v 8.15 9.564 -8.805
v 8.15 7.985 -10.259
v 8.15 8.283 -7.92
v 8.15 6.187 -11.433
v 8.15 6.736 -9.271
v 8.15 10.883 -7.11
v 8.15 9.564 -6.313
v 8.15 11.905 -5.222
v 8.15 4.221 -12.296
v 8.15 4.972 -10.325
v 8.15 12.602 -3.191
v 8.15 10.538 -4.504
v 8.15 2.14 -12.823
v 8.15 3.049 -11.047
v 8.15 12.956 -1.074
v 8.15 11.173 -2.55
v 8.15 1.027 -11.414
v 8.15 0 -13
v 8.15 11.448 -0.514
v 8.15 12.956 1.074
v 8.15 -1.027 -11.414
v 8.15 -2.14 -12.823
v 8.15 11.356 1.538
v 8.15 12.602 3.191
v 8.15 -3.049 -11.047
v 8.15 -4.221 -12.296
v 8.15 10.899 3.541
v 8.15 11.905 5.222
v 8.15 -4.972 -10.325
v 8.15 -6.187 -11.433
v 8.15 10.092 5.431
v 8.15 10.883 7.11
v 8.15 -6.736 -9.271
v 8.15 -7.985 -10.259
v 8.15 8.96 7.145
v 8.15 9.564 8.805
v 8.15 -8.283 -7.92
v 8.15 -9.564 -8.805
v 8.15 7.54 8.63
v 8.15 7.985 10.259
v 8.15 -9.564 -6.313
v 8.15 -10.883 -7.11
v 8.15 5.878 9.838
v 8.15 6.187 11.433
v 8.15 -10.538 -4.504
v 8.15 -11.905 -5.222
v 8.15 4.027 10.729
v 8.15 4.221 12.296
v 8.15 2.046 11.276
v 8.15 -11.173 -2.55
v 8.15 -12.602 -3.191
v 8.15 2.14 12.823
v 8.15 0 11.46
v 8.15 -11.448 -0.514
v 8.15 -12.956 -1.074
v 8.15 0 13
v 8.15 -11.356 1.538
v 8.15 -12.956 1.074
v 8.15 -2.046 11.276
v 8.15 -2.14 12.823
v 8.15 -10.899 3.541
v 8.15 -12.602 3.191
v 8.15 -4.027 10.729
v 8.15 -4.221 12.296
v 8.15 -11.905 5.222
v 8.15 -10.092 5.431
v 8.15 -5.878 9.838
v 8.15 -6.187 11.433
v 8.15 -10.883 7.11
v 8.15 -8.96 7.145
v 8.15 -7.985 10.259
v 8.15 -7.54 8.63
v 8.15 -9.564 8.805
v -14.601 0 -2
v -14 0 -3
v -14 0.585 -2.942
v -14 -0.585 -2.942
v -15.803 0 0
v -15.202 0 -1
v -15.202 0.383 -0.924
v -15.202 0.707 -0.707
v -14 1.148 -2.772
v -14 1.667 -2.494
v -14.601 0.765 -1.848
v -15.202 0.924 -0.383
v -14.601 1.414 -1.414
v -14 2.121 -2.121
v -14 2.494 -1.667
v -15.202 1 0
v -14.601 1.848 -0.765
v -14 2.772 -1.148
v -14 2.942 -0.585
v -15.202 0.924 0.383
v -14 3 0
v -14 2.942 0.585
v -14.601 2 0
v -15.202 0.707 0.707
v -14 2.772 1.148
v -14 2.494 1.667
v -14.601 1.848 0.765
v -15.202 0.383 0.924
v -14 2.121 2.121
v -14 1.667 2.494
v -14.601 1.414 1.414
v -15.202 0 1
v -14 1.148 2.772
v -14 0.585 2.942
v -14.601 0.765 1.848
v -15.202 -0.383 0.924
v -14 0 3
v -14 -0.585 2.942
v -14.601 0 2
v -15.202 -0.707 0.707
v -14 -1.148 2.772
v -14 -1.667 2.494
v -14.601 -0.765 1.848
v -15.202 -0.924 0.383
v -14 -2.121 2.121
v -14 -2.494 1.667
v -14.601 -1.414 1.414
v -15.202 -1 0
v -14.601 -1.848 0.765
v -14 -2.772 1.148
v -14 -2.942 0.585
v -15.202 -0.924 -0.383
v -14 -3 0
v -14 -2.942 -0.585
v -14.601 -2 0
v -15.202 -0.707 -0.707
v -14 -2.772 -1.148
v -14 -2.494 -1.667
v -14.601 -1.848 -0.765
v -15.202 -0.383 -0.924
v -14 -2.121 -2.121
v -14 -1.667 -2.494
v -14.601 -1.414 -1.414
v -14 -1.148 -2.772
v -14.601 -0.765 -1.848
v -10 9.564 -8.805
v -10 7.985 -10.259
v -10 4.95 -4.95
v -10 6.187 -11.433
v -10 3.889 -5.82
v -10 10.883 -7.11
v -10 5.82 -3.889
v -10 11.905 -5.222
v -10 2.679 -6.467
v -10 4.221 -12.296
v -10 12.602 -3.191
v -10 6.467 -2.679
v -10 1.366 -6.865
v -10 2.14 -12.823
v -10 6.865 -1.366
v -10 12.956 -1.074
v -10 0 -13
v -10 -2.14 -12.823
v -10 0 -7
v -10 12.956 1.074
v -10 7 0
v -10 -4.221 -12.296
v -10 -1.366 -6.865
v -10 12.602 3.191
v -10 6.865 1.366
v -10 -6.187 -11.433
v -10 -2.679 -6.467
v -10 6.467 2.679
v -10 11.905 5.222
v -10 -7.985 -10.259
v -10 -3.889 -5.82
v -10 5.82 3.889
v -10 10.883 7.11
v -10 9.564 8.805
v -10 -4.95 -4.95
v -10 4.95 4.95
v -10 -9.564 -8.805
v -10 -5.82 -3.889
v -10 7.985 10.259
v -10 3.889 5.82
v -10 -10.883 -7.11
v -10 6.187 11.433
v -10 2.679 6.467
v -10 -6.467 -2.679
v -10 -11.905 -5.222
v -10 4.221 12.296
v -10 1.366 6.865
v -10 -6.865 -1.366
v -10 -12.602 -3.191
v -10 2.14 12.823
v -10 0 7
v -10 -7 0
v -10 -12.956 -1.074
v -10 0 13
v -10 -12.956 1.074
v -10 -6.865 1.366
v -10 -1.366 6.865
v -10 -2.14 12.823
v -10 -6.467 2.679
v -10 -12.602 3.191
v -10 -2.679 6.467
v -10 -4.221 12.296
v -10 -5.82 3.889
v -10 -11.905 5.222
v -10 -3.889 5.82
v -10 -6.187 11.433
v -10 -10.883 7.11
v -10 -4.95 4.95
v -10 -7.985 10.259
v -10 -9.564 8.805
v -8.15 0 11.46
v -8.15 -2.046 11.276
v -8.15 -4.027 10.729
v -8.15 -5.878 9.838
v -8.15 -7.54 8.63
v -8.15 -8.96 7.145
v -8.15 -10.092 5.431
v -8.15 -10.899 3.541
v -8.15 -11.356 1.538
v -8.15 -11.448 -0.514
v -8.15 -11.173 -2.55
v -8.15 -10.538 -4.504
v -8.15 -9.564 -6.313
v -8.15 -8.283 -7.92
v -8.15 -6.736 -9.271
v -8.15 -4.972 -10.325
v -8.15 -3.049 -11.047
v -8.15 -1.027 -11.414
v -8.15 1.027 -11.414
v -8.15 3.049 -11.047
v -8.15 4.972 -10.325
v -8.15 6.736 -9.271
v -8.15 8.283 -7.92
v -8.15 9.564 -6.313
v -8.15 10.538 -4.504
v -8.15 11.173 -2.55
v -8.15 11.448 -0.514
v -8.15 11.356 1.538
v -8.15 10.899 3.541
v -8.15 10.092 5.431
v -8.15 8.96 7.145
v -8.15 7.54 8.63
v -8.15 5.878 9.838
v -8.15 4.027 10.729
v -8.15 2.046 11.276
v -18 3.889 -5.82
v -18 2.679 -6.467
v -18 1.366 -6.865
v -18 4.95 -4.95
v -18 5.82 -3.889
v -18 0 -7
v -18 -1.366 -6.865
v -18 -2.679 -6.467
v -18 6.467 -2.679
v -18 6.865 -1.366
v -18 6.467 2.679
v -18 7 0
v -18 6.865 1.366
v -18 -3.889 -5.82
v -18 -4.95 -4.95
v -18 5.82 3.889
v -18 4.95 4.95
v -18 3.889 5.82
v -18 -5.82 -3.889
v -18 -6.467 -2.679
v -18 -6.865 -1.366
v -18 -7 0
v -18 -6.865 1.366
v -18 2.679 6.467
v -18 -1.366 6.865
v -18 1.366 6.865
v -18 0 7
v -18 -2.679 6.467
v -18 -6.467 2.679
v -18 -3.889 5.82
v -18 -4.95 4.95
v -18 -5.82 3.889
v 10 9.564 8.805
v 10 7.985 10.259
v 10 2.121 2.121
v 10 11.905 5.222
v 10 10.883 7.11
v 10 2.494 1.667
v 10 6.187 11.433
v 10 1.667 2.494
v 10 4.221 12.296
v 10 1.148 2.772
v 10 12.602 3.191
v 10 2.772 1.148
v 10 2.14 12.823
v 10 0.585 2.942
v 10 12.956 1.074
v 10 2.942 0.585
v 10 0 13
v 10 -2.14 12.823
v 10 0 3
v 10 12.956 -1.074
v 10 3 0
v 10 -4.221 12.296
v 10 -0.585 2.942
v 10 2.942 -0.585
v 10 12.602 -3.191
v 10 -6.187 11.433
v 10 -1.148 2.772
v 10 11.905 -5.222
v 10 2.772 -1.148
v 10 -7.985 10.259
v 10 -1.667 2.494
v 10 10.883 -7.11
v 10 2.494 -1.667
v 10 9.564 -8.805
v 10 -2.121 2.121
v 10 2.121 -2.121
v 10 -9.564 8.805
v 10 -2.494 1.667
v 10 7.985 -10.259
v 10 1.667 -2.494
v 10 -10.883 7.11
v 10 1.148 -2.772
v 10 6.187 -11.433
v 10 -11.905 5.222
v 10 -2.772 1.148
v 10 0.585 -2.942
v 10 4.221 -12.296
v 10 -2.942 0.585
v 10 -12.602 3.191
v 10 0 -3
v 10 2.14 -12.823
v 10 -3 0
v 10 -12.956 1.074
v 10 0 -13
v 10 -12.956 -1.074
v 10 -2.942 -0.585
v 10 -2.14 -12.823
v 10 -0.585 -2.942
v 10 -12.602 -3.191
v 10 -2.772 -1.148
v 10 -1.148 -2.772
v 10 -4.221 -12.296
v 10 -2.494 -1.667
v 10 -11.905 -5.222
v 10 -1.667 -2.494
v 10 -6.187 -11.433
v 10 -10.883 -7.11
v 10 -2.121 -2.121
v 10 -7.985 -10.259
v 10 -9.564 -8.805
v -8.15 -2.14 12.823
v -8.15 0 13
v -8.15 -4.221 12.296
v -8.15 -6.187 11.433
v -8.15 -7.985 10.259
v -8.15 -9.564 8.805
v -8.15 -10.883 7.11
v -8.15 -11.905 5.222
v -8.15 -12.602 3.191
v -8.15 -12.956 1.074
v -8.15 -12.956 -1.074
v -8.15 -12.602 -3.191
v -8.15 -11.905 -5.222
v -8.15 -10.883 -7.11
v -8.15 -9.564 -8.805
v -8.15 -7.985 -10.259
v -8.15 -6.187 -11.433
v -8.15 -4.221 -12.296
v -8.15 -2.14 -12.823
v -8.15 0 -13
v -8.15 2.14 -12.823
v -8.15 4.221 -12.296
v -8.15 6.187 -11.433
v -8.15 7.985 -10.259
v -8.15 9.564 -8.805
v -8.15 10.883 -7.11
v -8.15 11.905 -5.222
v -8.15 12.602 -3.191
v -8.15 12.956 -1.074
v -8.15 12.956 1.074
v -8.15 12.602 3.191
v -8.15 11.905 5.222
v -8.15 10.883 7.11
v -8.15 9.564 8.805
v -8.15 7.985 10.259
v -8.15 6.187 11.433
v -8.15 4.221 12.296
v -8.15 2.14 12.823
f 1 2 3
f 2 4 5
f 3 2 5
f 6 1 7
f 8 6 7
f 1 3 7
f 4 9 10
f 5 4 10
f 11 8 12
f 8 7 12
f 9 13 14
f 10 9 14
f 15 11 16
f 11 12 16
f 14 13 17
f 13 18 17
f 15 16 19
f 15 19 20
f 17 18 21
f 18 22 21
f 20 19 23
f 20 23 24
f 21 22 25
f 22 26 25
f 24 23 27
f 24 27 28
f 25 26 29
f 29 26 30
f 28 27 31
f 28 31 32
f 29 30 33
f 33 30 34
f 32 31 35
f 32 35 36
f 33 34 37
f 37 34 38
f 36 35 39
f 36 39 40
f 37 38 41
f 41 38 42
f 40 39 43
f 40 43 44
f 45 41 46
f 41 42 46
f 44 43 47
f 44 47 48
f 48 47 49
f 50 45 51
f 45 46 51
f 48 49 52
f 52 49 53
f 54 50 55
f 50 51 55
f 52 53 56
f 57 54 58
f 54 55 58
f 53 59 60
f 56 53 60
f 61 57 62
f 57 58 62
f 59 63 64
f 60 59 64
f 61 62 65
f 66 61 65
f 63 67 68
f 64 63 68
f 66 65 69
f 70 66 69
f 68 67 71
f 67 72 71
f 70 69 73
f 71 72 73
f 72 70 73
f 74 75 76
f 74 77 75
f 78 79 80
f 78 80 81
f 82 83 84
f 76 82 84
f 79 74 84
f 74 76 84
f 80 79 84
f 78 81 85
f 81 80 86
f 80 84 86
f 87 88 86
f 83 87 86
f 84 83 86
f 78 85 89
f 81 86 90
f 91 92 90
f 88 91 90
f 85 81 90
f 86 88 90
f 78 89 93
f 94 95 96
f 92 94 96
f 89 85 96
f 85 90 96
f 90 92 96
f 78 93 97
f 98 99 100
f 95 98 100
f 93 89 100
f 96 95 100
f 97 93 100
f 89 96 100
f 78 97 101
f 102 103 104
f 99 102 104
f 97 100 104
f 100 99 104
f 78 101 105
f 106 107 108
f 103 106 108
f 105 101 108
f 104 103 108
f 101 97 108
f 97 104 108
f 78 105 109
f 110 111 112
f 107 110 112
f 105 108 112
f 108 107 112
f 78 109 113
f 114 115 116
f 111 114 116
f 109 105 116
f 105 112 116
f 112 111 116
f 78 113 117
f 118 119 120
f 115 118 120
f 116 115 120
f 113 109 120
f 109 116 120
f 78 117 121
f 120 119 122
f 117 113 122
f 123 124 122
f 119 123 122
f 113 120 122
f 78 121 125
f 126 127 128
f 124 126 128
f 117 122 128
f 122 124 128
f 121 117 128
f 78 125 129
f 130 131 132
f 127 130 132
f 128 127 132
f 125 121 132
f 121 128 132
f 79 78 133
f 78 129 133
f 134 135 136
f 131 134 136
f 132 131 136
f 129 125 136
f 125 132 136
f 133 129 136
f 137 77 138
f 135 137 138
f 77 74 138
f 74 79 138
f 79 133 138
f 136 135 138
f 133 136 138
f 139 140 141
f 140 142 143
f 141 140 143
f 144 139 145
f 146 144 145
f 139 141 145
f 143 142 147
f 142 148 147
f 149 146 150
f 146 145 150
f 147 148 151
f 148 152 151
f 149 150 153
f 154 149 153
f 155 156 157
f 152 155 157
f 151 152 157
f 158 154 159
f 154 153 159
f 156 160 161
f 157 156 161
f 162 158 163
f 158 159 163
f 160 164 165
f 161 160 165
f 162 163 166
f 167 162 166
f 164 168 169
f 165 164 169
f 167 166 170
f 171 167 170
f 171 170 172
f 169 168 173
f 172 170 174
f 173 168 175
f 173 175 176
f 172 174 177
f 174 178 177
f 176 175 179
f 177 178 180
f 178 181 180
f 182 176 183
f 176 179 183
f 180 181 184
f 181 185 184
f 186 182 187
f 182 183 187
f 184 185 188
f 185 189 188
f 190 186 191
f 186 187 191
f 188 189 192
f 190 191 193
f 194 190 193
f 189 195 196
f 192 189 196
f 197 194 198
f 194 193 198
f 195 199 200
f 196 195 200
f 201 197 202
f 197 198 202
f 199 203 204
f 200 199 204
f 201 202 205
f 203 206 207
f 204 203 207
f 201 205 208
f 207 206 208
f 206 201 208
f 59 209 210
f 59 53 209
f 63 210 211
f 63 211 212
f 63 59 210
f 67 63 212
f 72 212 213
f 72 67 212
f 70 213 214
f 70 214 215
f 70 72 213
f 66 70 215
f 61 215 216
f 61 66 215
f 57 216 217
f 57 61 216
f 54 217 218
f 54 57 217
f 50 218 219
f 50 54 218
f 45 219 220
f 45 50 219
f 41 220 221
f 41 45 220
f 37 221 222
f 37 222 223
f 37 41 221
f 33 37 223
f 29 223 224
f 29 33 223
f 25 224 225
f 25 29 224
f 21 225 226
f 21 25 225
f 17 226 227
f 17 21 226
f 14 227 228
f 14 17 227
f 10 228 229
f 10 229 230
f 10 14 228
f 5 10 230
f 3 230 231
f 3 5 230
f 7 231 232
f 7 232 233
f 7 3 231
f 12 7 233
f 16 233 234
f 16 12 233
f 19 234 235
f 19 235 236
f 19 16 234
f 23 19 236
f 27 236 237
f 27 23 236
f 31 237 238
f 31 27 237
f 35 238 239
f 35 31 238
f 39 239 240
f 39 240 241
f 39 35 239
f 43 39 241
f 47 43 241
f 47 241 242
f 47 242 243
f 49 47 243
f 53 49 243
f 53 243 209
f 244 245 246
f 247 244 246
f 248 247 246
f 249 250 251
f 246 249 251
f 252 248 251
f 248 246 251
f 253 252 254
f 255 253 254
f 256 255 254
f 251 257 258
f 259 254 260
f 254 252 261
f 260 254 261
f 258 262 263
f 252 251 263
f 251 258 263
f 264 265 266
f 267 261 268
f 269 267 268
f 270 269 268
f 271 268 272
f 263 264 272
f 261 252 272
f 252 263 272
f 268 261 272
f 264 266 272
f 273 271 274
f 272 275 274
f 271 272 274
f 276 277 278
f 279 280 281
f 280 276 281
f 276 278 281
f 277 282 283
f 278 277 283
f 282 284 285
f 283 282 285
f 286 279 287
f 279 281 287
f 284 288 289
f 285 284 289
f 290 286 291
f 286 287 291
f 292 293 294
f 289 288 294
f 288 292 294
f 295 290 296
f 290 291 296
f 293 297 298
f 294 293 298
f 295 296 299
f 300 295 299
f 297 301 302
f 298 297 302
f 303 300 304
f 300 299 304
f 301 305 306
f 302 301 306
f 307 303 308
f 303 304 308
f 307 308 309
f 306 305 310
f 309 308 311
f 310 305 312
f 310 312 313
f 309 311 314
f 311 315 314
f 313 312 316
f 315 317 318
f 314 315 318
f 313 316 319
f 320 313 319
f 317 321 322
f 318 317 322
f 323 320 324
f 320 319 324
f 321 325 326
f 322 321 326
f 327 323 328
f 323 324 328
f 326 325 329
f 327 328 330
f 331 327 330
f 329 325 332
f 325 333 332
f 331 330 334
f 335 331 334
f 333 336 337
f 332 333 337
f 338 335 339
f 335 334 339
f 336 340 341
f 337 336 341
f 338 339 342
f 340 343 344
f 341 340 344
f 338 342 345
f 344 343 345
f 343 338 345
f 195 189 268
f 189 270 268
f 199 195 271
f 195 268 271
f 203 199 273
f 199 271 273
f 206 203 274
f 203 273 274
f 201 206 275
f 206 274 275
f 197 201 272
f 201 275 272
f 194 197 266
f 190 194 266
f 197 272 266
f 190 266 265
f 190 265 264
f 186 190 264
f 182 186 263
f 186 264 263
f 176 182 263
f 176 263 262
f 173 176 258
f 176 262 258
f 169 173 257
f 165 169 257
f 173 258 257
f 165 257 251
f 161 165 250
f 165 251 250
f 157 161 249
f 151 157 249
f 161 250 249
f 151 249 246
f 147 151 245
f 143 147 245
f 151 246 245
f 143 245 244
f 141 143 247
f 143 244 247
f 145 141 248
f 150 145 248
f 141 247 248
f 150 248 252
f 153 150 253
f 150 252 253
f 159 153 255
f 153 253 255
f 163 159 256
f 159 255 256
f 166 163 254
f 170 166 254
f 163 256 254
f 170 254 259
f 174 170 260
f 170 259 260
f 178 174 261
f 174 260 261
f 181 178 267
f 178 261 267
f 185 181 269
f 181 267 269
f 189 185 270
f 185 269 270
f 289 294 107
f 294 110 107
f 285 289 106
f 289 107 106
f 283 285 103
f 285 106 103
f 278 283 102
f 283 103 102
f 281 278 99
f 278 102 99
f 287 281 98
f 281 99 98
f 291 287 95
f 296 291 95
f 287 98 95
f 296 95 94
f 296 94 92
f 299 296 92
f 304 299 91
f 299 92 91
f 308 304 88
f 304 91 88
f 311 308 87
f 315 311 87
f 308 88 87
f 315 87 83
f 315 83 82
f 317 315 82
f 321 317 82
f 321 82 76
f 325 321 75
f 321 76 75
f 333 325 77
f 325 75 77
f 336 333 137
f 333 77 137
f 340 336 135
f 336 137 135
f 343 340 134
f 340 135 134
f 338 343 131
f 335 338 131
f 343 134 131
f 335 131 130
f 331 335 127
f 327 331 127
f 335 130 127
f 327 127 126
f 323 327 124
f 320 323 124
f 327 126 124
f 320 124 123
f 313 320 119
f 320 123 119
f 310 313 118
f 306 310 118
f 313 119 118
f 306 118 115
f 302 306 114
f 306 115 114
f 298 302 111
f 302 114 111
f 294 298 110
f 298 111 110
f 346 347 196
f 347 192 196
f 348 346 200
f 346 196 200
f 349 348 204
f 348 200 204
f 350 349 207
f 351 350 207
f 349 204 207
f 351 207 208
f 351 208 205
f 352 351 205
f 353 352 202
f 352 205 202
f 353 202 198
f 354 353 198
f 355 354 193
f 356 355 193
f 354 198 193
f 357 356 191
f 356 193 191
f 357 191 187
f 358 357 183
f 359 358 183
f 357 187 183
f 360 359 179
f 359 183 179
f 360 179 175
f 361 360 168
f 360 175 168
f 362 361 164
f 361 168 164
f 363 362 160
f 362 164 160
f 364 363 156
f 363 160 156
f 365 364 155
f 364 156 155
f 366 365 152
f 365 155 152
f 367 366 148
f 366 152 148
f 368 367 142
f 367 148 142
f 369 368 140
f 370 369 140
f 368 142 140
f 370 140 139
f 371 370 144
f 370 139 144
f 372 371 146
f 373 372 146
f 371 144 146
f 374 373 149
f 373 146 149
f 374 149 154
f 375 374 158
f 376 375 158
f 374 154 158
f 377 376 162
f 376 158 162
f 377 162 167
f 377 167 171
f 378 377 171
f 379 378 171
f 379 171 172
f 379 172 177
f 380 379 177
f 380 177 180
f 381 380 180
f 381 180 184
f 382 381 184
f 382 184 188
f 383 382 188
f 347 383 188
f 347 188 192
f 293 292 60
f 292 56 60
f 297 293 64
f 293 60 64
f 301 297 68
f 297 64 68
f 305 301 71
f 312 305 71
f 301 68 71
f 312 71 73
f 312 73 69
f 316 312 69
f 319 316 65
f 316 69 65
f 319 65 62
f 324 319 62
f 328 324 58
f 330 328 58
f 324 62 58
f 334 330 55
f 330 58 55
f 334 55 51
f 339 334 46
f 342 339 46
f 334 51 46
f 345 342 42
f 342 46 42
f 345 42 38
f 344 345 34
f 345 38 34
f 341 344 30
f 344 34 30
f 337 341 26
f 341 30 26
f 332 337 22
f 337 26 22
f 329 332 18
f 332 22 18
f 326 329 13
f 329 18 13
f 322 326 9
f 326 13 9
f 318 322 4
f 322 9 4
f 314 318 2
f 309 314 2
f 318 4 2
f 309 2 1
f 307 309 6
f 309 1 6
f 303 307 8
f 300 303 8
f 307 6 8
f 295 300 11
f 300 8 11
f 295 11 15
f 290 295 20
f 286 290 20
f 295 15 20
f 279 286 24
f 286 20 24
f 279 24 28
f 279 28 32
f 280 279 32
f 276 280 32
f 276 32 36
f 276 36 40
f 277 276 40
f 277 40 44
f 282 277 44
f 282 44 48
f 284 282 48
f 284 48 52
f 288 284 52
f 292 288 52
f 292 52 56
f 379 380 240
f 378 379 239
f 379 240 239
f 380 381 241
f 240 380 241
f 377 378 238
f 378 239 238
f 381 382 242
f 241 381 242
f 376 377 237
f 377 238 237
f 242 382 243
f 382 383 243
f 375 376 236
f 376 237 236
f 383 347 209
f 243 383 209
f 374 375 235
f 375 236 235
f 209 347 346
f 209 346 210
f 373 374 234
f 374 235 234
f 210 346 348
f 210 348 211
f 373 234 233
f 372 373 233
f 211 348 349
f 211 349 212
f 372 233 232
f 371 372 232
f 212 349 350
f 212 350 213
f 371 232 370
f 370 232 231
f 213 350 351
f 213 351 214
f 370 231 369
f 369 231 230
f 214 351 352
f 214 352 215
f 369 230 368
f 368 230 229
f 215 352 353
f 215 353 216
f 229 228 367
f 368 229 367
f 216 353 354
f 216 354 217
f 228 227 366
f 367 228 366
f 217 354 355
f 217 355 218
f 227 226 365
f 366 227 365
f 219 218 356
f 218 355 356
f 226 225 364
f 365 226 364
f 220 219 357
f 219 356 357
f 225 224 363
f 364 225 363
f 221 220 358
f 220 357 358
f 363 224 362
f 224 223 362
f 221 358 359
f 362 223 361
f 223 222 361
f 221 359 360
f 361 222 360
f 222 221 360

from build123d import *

# Parameters (mm, degrees)
F_6_0_6_DIAMETER_HOLE2_D     = 6
F_6_0_6_DIAMETER_HOLE2_DEPTH = 24
F_6_0_6_DIAMETER_HOLE2_TIP   = 1.802581857


with BuildPart() as part:
    # Sketch1 → Revolve1 (revolve)
    with BuildSketch(Plane(origin=(0, 0, 0), x_dir=(1, 0, 0), z_dir=(0, 1, 0))):
        Polygon((0, -11.46), (-8.15, -11.46), (-8.15, -13), (-10, -13), (-10, -7), (-18, -7), (-18, 0), (-10, 0), (10, 0), (10, -13), (8.15, -13), (8.15, -11.46), align=None)
    revolve(axis=Axis((-10, 0, 0), (1, 0, 0)))

    # Ø6.0 (6) Diameter Hole2
    with Locations(Plane(origin=(10, 0, 0), x_dir=(0, 0, -1), z_dir=(1, 0, 0))):
        with Locations((0, 0)):
            Hole(F_6_0_6_DIAMETER_HOLE2_D / 2, depth=F_6_0_6_DIAMETER_HOLE2_DEPTH)
            with Locations((0, 0, -(F_6_0_6_DIAMETER_HOLE2_DEPTH + F_6_0_6_DIAMETER_HOLE2_TIP / 2))):  # 118° drill point
                Cone(0, F_6_0_6_DIAMETER_HOLE2_D / 2, F_6_0_6_DIAMETER_HOLE2_TIP, mode=Mode.SUBTRACT)


solid = part.part
